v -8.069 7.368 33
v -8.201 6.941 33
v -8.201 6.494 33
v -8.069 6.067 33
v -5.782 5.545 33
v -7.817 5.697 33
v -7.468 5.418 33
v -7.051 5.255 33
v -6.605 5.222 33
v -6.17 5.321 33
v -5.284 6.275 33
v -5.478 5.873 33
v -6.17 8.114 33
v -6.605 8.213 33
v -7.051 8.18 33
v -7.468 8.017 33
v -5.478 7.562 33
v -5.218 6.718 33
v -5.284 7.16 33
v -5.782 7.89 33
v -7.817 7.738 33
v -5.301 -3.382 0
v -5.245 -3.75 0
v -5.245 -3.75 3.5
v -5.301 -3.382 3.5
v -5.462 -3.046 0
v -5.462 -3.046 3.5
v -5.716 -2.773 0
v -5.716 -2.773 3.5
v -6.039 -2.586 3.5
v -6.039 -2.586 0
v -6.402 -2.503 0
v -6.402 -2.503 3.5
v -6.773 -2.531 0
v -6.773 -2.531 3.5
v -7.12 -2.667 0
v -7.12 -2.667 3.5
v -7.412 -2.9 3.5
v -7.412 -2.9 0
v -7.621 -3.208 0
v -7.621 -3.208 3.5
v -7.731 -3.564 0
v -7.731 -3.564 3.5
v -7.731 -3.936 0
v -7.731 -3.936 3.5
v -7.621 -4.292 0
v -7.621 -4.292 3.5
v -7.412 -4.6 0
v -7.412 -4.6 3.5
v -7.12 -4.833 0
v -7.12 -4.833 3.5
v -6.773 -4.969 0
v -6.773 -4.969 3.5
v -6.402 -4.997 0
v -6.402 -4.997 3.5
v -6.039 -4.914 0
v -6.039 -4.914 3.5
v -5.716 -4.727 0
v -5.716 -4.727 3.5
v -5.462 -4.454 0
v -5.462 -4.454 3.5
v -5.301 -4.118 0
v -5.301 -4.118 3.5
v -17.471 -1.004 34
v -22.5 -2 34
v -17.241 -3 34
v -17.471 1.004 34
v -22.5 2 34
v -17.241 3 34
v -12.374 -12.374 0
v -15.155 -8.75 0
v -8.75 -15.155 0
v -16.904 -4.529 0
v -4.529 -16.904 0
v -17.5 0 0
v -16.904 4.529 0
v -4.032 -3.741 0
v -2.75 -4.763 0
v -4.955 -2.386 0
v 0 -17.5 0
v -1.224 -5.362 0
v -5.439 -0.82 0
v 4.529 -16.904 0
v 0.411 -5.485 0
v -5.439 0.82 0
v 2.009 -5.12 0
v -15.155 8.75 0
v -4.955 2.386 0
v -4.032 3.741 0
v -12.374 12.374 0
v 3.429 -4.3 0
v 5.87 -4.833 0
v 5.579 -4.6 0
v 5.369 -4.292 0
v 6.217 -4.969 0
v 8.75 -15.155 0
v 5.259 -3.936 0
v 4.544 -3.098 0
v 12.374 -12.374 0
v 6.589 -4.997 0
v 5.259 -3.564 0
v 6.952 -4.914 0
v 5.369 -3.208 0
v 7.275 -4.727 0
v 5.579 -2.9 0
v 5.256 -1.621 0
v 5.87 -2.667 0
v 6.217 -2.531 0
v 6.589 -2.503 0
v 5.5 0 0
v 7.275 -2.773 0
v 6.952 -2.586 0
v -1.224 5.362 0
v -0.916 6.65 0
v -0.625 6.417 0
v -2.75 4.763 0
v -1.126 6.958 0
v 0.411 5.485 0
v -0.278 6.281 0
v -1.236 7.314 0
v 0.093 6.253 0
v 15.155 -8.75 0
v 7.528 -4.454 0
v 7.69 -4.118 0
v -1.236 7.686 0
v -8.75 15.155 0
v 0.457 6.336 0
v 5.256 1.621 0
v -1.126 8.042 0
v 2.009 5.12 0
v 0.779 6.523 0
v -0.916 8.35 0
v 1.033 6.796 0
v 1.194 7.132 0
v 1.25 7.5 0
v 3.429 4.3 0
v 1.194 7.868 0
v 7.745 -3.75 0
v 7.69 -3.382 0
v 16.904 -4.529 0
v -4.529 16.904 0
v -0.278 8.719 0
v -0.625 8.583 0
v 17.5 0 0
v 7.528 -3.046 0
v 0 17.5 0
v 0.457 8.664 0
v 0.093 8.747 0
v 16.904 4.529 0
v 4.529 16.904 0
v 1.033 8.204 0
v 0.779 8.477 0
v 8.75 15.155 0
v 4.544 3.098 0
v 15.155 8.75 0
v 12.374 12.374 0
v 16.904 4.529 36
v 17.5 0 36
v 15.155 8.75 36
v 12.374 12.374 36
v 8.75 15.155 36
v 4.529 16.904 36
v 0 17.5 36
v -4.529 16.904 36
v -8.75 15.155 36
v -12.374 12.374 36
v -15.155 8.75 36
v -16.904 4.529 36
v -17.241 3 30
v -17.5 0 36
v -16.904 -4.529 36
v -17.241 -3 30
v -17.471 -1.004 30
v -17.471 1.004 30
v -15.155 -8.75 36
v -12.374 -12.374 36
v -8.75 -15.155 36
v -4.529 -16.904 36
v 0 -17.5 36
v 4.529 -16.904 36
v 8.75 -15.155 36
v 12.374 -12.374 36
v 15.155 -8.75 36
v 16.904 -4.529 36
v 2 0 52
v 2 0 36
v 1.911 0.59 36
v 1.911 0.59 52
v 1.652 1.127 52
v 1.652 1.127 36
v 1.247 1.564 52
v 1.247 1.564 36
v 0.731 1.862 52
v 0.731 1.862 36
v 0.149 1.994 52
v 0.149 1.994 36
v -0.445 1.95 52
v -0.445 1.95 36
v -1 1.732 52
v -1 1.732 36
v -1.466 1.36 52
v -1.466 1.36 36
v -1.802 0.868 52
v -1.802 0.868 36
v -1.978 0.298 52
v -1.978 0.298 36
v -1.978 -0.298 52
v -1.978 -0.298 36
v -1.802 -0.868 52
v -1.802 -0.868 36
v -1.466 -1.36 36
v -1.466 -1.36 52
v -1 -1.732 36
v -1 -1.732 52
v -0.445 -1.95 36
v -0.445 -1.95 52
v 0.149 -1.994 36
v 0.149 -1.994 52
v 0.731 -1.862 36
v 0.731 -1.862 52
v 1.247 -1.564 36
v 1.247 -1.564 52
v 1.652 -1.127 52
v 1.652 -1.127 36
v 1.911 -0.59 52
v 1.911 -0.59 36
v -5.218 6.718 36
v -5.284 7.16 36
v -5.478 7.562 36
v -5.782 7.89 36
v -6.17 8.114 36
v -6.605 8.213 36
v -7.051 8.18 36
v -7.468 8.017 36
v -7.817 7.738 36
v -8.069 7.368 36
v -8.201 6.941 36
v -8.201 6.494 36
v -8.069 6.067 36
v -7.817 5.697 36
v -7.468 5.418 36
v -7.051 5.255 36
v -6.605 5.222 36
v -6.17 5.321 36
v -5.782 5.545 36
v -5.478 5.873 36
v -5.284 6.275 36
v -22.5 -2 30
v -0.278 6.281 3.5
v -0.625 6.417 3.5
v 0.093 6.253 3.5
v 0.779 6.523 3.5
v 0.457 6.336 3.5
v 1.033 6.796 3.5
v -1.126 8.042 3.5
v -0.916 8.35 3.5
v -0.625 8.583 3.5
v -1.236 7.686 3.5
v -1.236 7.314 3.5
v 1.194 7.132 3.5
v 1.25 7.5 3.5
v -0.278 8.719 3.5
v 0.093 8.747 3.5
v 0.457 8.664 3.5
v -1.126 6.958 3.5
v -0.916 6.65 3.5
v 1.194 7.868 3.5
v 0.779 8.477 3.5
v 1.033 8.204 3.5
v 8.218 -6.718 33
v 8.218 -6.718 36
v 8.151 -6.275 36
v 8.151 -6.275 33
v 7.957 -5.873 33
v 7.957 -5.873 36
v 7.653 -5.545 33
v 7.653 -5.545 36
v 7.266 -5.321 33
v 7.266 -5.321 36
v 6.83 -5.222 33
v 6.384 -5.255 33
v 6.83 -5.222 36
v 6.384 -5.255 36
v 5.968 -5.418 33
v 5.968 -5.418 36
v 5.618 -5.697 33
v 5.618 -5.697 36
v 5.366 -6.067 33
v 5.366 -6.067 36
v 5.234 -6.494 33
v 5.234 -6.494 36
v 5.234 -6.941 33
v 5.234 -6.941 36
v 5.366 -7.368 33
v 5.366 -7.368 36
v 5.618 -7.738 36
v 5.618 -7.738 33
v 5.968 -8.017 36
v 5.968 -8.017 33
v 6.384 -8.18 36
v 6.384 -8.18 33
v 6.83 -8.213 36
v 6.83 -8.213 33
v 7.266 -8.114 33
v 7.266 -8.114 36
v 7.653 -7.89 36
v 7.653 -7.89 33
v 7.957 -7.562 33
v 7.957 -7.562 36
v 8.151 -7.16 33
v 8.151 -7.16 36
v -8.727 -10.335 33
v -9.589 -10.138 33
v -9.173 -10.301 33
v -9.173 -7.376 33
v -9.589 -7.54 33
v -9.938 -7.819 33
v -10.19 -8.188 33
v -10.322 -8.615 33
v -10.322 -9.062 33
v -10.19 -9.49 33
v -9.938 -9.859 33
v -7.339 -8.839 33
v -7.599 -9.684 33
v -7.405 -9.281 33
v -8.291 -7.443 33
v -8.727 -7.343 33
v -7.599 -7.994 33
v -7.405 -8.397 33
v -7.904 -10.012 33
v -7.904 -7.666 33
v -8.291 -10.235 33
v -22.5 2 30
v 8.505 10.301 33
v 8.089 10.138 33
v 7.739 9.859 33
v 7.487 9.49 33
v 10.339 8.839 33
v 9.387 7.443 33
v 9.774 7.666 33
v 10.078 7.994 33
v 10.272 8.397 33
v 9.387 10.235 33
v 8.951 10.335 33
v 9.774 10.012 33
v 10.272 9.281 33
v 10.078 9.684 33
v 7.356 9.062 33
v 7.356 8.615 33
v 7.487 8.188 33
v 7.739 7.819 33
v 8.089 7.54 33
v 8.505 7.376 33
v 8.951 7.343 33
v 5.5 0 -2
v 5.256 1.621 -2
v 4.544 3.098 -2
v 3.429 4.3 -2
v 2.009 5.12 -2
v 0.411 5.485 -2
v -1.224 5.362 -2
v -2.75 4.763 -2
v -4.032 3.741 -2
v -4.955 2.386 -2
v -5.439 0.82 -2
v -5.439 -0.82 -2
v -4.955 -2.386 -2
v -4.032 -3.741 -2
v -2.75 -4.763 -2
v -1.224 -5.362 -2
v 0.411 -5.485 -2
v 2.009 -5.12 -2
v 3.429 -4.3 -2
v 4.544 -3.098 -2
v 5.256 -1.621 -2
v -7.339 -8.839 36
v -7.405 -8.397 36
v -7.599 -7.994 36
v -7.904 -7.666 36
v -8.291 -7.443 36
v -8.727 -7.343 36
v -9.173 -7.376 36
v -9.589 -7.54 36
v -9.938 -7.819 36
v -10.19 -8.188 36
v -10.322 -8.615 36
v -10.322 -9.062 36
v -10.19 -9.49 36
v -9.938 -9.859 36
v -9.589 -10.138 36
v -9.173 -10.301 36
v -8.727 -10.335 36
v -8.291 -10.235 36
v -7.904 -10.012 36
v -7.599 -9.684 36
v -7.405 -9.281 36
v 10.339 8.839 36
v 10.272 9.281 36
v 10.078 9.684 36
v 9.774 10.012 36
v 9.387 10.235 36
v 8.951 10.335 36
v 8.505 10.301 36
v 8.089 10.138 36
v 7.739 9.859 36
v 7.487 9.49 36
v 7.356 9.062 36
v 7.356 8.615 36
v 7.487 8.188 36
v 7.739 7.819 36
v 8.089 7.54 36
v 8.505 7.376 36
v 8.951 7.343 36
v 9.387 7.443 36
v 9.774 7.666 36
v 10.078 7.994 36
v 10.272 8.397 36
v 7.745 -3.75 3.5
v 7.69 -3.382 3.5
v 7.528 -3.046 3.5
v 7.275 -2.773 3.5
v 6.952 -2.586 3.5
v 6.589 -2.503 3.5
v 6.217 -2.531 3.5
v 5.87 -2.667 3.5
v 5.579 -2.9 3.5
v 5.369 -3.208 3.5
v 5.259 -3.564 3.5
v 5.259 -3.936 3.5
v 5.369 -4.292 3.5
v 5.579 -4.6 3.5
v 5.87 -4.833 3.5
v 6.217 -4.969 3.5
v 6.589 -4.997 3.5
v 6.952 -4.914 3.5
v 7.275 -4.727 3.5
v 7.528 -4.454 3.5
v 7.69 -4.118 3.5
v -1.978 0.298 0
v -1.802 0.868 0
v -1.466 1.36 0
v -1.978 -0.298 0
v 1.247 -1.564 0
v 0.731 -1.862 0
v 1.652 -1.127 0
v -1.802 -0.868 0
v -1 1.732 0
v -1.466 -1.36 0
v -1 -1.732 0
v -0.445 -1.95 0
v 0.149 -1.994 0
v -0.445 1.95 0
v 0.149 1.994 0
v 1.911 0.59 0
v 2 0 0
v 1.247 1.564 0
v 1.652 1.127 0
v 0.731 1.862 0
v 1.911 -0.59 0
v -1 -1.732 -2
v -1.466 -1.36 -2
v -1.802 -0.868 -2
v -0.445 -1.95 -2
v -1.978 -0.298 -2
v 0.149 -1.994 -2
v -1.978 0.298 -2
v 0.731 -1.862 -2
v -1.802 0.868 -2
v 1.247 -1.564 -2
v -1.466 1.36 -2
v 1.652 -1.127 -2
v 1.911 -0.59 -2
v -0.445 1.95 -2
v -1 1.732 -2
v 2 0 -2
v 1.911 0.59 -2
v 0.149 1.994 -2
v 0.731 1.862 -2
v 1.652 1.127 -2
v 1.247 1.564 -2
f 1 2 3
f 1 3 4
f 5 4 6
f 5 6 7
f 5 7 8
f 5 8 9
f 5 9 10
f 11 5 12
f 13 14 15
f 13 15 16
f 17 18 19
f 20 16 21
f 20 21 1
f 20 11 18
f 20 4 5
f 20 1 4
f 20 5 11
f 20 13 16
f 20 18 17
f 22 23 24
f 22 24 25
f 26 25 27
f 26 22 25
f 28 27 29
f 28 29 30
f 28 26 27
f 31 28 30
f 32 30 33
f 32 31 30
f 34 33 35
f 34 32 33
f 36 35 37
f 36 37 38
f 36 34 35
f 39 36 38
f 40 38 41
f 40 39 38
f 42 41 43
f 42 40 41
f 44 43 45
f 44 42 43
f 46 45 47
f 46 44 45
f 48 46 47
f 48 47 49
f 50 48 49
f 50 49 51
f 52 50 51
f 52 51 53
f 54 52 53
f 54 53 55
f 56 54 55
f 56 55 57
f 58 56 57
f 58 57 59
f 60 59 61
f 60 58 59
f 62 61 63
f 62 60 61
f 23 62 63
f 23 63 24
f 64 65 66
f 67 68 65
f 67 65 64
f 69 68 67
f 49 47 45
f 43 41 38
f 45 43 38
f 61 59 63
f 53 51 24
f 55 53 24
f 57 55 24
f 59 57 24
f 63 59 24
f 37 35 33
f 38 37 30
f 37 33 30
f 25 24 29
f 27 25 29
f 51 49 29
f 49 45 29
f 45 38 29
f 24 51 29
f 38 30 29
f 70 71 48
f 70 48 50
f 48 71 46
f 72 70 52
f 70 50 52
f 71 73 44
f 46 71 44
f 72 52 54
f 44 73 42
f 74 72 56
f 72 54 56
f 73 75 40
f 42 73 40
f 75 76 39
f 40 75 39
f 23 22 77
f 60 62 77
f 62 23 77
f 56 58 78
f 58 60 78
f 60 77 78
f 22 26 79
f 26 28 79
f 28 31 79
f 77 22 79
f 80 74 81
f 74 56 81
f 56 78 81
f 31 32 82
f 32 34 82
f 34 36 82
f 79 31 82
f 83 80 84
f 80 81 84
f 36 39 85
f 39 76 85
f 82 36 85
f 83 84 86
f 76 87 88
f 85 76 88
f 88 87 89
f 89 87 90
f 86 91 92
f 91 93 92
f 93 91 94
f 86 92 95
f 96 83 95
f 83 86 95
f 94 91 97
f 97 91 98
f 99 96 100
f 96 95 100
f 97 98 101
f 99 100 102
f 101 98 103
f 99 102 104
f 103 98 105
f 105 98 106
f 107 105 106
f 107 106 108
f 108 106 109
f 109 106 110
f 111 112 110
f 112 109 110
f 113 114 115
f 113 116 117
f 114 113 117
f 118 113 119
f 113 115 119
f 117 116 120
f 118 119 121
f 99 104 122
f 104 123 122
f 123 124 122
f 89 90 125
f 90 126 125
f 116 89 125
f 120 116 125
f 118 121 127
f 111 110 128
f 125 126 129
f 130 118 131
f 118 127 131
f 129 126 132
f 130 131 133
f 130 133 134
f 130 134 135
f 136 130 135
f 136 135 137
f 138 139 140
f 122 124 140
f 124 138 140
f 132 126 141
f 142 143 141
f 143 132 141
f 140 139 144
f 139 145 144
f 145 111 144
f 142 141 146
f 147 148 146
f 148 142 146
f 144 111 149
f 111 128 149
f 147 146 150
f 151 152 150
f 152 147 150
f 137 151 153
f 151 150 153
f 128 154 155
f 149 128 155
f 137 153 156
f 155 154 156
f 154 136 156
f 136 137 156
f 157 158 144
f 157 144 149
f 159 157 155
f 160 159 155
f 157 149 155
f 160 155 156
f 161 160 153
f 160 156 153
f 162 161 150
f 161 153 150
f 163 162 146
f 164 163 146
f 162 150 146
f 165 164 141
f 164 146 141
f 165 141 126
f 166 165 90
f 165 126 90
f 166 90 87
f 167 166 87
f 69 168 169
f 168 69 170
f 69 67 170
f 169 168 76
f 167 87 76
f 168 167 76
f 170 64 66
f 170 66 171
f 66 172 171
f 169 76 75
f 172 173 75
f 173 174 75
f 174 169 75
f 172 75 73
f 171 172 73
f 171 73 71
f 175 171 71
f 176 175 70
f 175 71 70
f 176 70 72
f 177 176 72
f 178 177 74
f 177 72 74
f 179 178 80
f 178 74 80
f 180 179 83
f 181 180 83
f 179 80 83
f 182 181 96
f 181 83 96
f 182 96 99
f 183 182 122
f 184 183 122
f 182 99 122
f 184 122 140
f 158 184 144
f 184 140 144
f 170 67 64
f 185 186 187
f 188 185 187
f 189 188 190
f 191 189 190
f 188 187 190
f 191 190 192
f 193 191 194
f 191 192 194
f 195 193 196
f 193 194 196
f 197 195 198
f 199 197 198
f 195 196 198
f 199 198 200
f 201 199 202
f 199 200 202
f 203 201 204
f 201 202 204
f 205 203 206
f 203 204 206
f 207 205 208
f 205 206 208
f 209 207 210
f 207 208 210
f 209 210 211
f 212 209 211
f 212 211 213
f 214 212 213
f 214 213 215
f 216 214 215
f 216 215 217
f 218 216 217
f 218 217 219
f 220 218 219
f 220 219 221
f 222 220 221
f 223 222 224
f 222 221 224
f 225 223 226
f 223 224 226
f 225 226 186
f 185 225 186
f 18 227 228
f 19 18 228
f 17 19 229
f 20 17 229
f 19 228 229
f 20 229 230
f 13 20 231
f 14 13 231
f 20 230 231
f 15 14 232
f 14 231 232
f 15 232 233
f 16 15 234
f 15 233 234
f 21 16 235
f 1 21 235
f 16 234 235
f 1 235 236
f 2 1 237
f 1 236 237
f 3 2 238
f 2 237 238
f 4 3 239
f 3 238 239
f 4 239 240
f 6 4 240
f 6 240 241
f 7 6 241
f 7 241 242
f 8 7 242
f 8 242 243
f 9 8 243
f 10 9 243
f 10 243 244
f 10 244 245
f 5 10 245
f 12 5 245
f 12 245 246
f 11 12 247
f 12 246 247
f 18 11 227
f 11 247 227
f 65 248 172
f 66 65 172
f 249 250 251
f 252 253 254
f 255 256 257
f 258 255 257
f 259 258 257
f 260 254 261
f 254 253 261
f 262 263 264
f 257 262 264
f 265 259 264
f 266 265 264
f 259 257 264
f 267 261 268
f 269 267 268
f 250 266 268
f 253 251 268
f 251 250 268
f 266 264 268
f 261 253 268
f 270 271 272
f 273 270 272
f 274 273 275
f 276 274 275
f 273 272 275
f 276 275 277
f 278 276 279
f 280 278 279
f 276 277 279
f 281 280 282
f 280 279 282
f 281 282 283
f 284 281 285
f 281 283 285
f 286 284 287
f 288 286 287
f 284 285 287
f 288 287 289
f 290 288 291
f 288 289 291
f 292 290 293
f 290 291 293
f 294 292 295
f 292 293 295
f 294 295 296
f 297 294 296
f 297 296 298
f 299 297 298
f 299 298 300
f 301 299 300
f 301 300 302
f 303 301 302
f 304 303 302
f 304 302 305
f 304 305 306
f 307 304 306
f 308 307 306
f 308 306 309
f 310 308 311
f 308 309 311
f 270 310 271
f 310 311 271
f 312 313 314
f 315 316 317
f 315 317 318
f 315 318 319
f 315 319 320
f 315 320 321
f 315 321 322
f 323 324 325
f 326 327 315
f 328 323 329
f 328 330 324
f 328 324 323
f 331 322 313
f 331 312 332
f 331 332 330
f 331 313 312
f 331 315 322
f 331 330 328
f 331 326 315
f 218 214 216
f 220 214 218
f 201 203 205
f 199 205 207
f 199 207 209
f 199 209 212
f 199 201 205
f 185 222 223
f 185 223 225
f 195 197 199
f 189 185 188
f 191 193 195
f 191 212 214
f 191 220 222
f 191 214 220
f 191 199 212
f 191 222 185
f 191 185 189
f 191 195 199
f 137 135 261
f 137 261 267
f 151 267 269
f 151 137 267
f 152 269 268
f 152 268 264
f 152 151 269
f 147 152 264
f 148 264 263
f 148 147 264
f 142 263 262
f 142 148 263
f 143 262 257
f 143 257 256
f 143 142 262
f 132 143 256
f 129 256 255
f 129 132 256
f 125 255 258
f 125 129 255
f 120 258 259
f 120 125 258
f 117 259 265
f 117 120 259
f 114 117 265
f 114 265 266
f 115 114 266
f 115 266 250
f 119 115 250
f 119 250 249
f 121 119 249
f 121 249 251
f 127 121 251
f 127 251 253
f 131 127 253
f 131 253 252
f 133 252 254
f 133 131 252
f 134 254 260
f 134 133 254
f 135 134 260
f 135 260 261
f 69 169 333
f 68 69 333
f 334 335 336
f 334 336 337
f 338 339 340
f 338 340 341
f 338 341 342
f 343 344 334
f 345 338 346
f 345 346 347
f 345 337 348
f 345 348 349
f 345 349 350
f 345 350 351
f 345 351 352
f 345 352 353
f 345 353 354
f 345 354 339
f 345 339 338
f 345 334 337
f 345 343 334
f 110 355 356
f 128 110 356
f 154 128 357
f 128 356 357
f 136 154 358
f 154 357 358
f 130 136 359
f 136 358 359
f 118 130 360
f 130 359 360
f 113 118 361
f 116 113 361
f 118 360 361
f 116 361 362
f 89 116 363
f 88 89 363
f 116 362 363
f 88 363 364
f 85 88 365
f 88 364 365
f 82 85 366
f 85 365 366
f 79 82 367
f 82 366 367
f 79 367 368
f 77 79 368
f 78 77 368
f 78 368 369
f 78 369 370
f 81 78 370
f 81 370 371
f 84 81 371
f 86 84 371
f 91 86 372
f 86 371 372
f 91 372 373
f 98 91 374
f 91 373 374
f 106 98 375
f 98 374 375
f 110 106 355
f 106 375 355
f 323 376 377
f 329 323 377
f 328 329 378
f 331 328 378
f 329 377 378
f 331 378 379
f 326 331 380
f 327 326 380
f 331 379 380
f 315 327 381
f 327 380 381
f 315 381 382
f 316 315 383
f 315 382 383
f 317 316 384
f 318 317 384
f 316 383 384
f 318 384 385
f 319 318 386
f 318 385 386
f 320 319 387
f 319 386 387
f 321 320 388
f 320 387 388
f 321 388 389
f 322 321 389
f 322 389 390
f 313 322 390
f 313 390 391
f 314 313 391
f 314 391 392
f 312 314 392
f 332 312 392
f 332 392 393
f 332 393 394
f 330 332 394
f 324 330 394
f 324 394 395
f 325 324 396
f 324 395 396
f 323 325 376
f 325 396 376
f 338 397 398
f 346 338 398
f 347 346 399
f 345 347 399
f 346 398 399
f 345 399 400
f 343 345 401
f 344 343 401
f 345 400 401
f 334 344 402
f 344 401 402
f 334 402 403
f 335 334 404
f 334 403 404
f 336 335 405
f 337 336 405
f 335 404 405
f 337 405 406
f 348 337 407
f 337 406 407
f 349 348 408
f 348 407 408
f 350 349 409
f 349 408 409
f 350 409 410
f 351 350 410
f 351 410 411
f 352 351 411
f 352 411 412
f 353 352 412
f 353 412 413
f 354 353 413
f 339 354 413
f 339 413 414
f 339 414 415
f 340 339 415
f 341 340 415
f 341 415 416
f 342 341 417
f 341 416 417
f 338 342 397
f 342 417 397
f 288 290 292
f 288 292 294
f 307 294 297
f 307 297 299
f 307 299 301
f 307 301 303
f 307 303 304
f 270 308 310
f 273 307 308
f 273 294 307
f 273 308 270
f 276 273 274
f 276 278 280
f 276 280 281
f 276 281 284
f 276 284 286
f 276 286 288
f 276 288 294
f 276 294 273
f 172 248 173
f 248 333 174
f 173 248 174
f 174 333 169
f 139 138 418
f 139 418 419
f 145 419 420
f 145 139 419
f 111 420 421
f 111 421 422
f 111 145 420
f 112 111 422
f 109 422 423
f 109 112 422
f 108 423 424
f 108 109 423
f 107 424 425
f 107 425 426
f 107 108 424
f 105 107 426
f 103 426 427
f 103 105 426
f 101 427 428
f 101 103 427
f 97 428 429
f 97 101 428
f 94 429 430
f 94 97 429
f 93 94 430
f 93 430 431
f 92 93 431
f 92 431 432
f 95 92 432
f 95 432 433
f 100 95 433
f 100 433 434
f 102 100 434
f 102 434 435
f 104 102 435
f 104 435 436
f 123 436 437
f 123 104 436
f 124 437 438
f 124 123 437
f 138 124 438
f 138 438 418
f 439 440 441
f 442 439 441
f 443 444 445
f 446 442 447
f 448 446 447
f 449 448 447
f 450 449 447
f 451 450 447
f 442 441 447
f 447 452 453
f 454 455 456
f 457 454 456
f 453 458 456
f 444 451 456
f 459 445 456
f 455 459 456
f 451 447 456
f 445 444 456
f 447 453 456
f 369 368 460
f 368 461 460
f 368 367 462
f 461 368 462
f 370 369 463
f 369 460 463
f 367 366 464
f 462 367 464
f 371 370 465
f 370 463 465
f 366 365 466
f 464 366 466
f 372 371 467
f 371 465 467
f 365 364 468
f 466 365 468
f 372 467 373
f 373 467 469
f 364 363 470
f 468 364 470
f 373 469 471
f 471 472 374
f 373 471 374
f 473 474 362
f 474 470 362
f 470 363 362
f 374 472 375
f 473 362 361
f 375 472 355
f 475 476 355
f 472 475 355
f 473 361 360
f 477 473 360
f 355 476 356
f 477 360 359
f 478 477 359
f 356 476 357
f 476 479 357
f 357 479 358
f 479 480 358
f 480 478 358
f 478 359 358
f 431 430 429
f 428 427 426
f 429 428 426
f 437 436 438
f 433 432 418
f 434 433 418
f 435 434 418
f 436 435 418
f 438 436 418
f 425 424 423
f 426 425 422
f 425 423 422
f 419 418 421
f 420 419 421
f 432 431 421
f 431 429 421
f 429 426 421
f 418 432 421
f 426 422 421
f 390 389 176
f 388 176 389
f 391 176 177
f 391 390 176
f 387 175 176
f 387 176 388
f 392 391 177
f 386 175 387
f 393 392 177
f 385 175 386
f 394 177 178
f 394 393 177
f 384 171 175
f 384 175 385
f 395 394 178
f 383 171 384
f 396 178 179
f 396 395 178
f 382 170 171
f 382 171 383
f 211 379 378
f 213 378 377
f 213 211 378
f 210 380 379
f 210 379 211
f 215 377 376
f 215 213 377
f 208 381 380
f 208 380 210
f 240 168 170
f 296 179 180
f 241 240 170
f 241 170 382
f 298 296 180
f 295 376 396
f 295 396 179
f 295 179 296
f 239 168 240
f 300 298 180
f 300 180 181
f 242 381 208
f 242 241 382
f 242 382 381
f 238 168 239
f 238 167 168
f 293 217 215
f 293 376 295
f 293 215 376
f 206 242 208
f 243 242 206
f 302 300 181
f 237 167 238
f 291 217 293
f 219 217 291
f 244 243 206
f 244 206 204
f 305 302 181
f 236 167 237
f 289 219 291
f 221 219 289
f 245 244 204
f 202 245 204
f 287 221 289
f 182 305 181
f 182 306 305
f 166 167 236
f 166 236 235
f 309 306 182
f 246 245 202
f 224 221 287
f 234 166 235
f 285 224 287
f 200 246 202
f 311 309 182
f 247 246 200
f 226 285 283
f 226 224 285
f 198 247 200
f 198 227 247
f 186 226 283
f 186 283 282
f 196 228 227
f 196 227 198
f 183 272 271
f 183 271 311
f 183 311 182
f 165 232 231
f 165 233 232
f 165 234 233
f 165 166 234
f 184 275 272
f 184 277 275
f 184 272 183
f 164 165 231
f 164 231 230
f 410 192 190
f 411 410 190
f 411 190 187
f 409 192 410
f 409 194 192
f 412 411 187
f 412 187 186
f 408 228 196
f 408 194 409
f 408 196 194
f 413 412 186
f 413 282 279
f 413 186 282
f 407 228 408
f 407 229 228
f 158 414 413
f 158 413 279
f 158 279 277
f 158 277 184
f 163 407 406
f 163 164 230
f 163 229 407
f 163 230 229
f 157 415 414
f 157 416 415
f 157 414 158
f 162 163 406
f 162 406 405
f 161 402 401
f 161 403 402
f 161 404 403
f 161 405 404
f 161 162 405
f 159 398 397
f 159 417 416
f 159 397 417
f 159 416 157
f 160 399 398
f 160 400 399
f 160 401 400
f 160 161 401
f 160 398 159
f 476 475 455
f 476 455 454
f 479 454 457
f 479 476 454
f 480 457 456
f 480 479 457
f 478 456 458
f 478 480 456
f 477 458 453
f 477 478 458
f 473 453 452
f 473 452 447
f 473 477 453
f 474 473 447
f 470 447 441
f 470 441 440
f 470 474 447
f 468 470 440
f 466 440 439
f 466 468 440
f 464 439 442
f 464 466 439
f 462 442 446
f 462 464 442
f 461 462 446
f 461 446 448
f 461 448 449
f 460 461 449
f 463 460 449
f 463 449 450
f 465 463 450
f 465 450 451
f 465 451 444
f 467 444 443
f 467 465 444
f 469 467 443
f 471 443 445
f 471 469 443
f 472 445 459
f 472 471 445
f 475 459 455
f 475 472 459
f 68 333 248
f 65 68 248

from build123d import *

# Parameters (mm, degrees)
SKETCH3_R           = 17.5
SKETCH3_R_2         = 1.25
SKETCH3_R_3         = 5.5
SKETCH3_R_4         = 2
BOSS_EXTRUDE2_DEPTH = 36
BOSS_EXTRUDE3_START = 36
SKETCH3_4_R         = 2
BOSS_EXTRUDE3_DEPTH = 16
BOSS_EXTRUDE4_START = -2
SKETCH3_5_R         = 5.5
SKETCH3_5_R_2       = 2
BOSS_EXTRUDE4_DEPTH = 2
SKETCH3_8_R         = 1.25
CUT_EXTRUDE1_DEPTH  = 3.5
CUT_EXTRUDE2_START  = 36
BASE_R              = 1.5
CUT_EXTRUDE2_DEPTH  = 3
BOSS_EXTRUDE5_START = 30
BOSS_EXTRUDE5_DEPTH = 4


with BuildPart() as part:
    # Sketch3 → Boss-Extrude2 (new body)
    # profile 1 of 6: a face of its own
    with BuildSketch(Plane.XY):
        Circle(SKETCH3_R)
        with Locations((-6.495190528, -3.75)):
            Circle(SKETCH3_R_2, mode=Mode.SUBTRACT)
        with Locations((6.495190528, -3.75)):
            Circle(SKETCH3_R_2, mode=Mode.SUBTRACT)
        with Locations((0, 7.5)):
            Circle(SKETCH3_R_2, mode=Mode.SUBTRACT)
        Circle(SKETCH3_R_3, mode=Mode.SUBTRACT)
    # profile 2 of 6: a face of its own
    with BuildSketch(Plane.XY):
        with Locations((0, 7.5)):
            Circle(SKETCH3_R_2)
    # profile 3 of 6: a face of its own
    with BuildSketch(Plane.XY):
        Circle(SKETCH3_R_3)
        Circle(SKETCH3_R_4, mode=Mode.SUBTRACT)
    # profile 4 of 6: a face of its own
    with BuildSketch(Plane.XY):
        Circle(SKETCH3_R_4)
    # profile 5 of 6: a face of its own
    with BuildSketch(Plane.XY):
        with Locations((-6.495190528, -3.75)):
            Circle(SKETCH3_R_2)
    # profile 6 of 6: a face of its own
    with BuildSketch(Plane.XY):
        with Locations((6.495190528, -3.75)):
            Circle(SKETCH3_R_2)
    extrude(amount=BOSS_EXTRUDE2_DEPTH)

    # Sketch3<4> → Boss-Extrude3 (add)
    with BuildSketch(Plane.XY.offset(BOSS_EXTRUDE3_START)):
        Circle(SKETCH3_4_R)
    extrude(amount=BOSS_EXTRUDE3_DEPTH)

    # Sketch3<5> → Boss-Extrude4 (add)
    with BuildSketch(Plane.XY.offset(BOSS_EXTRUDE4_START)):
        Circle(SKETCH3_5_R)
        Circle(SKETCH3_5_R_2, mode=Mode.SUBTRACT)
    extrude(amount=BOSS_EXTRUDE4_DEPTH)

    # Sketch3<8> → Cut-Extrude1 (cut)
    with BuildSketch(Plane.XY):
        with Locations((0, 7.5)):
            Circle(SKETCH3_8_R)
        with Locations((6.495190528, -3.75)):
            Circle(SKETCH3_8_R)
        with Locations((-6.495190528, -3.75)):
            Circle(SKETCH3_8_R)
    extrude(amount=CUT_EXTRUDE1_DEPTH, mode=Mode.SUBTRACT)

    # Base → Cut-Extrude2 (cut)
    with BuildSketch(Plane.XY.offset(CUT_EXTRUDE2_START)):
        with Locations((8.838834765, 8.838834765)):
            Circle(BASE_R)
        with Locations((-6.717514421, 6.717514421)):
            Circle(BASE_R)
        with Locations((-8.838834765, -8.838834765)):
            Circle(BASE_R)
        with Locations((6.717514421, -6.717514421)):
            Circle(BASE_R)
    extrude(amount=-CUT_EXTRUDE2_DEPTH, mode=Mode.SUBTRACT)

    # Base<4> → Boss-Extrude5 (add)
    with BuildSketch(Plane.XY.offset(BOSS_EXTRUDE5_START)):
        with BuildLine():
            ThreePointArc((-17.24093965, -3), (-17.5, 0), (-17.24093965, 3))
            Line((-17.24093965, 3), (-22.5, 2))
            Line((-22.5, 2), (-22.5, -2))
            Line((-22.5, -2), (-17.24093965, -3))
        make_face()
    extrude(amount=BOSS_EXTRUDE5_DEPTH)


solid = part.part
